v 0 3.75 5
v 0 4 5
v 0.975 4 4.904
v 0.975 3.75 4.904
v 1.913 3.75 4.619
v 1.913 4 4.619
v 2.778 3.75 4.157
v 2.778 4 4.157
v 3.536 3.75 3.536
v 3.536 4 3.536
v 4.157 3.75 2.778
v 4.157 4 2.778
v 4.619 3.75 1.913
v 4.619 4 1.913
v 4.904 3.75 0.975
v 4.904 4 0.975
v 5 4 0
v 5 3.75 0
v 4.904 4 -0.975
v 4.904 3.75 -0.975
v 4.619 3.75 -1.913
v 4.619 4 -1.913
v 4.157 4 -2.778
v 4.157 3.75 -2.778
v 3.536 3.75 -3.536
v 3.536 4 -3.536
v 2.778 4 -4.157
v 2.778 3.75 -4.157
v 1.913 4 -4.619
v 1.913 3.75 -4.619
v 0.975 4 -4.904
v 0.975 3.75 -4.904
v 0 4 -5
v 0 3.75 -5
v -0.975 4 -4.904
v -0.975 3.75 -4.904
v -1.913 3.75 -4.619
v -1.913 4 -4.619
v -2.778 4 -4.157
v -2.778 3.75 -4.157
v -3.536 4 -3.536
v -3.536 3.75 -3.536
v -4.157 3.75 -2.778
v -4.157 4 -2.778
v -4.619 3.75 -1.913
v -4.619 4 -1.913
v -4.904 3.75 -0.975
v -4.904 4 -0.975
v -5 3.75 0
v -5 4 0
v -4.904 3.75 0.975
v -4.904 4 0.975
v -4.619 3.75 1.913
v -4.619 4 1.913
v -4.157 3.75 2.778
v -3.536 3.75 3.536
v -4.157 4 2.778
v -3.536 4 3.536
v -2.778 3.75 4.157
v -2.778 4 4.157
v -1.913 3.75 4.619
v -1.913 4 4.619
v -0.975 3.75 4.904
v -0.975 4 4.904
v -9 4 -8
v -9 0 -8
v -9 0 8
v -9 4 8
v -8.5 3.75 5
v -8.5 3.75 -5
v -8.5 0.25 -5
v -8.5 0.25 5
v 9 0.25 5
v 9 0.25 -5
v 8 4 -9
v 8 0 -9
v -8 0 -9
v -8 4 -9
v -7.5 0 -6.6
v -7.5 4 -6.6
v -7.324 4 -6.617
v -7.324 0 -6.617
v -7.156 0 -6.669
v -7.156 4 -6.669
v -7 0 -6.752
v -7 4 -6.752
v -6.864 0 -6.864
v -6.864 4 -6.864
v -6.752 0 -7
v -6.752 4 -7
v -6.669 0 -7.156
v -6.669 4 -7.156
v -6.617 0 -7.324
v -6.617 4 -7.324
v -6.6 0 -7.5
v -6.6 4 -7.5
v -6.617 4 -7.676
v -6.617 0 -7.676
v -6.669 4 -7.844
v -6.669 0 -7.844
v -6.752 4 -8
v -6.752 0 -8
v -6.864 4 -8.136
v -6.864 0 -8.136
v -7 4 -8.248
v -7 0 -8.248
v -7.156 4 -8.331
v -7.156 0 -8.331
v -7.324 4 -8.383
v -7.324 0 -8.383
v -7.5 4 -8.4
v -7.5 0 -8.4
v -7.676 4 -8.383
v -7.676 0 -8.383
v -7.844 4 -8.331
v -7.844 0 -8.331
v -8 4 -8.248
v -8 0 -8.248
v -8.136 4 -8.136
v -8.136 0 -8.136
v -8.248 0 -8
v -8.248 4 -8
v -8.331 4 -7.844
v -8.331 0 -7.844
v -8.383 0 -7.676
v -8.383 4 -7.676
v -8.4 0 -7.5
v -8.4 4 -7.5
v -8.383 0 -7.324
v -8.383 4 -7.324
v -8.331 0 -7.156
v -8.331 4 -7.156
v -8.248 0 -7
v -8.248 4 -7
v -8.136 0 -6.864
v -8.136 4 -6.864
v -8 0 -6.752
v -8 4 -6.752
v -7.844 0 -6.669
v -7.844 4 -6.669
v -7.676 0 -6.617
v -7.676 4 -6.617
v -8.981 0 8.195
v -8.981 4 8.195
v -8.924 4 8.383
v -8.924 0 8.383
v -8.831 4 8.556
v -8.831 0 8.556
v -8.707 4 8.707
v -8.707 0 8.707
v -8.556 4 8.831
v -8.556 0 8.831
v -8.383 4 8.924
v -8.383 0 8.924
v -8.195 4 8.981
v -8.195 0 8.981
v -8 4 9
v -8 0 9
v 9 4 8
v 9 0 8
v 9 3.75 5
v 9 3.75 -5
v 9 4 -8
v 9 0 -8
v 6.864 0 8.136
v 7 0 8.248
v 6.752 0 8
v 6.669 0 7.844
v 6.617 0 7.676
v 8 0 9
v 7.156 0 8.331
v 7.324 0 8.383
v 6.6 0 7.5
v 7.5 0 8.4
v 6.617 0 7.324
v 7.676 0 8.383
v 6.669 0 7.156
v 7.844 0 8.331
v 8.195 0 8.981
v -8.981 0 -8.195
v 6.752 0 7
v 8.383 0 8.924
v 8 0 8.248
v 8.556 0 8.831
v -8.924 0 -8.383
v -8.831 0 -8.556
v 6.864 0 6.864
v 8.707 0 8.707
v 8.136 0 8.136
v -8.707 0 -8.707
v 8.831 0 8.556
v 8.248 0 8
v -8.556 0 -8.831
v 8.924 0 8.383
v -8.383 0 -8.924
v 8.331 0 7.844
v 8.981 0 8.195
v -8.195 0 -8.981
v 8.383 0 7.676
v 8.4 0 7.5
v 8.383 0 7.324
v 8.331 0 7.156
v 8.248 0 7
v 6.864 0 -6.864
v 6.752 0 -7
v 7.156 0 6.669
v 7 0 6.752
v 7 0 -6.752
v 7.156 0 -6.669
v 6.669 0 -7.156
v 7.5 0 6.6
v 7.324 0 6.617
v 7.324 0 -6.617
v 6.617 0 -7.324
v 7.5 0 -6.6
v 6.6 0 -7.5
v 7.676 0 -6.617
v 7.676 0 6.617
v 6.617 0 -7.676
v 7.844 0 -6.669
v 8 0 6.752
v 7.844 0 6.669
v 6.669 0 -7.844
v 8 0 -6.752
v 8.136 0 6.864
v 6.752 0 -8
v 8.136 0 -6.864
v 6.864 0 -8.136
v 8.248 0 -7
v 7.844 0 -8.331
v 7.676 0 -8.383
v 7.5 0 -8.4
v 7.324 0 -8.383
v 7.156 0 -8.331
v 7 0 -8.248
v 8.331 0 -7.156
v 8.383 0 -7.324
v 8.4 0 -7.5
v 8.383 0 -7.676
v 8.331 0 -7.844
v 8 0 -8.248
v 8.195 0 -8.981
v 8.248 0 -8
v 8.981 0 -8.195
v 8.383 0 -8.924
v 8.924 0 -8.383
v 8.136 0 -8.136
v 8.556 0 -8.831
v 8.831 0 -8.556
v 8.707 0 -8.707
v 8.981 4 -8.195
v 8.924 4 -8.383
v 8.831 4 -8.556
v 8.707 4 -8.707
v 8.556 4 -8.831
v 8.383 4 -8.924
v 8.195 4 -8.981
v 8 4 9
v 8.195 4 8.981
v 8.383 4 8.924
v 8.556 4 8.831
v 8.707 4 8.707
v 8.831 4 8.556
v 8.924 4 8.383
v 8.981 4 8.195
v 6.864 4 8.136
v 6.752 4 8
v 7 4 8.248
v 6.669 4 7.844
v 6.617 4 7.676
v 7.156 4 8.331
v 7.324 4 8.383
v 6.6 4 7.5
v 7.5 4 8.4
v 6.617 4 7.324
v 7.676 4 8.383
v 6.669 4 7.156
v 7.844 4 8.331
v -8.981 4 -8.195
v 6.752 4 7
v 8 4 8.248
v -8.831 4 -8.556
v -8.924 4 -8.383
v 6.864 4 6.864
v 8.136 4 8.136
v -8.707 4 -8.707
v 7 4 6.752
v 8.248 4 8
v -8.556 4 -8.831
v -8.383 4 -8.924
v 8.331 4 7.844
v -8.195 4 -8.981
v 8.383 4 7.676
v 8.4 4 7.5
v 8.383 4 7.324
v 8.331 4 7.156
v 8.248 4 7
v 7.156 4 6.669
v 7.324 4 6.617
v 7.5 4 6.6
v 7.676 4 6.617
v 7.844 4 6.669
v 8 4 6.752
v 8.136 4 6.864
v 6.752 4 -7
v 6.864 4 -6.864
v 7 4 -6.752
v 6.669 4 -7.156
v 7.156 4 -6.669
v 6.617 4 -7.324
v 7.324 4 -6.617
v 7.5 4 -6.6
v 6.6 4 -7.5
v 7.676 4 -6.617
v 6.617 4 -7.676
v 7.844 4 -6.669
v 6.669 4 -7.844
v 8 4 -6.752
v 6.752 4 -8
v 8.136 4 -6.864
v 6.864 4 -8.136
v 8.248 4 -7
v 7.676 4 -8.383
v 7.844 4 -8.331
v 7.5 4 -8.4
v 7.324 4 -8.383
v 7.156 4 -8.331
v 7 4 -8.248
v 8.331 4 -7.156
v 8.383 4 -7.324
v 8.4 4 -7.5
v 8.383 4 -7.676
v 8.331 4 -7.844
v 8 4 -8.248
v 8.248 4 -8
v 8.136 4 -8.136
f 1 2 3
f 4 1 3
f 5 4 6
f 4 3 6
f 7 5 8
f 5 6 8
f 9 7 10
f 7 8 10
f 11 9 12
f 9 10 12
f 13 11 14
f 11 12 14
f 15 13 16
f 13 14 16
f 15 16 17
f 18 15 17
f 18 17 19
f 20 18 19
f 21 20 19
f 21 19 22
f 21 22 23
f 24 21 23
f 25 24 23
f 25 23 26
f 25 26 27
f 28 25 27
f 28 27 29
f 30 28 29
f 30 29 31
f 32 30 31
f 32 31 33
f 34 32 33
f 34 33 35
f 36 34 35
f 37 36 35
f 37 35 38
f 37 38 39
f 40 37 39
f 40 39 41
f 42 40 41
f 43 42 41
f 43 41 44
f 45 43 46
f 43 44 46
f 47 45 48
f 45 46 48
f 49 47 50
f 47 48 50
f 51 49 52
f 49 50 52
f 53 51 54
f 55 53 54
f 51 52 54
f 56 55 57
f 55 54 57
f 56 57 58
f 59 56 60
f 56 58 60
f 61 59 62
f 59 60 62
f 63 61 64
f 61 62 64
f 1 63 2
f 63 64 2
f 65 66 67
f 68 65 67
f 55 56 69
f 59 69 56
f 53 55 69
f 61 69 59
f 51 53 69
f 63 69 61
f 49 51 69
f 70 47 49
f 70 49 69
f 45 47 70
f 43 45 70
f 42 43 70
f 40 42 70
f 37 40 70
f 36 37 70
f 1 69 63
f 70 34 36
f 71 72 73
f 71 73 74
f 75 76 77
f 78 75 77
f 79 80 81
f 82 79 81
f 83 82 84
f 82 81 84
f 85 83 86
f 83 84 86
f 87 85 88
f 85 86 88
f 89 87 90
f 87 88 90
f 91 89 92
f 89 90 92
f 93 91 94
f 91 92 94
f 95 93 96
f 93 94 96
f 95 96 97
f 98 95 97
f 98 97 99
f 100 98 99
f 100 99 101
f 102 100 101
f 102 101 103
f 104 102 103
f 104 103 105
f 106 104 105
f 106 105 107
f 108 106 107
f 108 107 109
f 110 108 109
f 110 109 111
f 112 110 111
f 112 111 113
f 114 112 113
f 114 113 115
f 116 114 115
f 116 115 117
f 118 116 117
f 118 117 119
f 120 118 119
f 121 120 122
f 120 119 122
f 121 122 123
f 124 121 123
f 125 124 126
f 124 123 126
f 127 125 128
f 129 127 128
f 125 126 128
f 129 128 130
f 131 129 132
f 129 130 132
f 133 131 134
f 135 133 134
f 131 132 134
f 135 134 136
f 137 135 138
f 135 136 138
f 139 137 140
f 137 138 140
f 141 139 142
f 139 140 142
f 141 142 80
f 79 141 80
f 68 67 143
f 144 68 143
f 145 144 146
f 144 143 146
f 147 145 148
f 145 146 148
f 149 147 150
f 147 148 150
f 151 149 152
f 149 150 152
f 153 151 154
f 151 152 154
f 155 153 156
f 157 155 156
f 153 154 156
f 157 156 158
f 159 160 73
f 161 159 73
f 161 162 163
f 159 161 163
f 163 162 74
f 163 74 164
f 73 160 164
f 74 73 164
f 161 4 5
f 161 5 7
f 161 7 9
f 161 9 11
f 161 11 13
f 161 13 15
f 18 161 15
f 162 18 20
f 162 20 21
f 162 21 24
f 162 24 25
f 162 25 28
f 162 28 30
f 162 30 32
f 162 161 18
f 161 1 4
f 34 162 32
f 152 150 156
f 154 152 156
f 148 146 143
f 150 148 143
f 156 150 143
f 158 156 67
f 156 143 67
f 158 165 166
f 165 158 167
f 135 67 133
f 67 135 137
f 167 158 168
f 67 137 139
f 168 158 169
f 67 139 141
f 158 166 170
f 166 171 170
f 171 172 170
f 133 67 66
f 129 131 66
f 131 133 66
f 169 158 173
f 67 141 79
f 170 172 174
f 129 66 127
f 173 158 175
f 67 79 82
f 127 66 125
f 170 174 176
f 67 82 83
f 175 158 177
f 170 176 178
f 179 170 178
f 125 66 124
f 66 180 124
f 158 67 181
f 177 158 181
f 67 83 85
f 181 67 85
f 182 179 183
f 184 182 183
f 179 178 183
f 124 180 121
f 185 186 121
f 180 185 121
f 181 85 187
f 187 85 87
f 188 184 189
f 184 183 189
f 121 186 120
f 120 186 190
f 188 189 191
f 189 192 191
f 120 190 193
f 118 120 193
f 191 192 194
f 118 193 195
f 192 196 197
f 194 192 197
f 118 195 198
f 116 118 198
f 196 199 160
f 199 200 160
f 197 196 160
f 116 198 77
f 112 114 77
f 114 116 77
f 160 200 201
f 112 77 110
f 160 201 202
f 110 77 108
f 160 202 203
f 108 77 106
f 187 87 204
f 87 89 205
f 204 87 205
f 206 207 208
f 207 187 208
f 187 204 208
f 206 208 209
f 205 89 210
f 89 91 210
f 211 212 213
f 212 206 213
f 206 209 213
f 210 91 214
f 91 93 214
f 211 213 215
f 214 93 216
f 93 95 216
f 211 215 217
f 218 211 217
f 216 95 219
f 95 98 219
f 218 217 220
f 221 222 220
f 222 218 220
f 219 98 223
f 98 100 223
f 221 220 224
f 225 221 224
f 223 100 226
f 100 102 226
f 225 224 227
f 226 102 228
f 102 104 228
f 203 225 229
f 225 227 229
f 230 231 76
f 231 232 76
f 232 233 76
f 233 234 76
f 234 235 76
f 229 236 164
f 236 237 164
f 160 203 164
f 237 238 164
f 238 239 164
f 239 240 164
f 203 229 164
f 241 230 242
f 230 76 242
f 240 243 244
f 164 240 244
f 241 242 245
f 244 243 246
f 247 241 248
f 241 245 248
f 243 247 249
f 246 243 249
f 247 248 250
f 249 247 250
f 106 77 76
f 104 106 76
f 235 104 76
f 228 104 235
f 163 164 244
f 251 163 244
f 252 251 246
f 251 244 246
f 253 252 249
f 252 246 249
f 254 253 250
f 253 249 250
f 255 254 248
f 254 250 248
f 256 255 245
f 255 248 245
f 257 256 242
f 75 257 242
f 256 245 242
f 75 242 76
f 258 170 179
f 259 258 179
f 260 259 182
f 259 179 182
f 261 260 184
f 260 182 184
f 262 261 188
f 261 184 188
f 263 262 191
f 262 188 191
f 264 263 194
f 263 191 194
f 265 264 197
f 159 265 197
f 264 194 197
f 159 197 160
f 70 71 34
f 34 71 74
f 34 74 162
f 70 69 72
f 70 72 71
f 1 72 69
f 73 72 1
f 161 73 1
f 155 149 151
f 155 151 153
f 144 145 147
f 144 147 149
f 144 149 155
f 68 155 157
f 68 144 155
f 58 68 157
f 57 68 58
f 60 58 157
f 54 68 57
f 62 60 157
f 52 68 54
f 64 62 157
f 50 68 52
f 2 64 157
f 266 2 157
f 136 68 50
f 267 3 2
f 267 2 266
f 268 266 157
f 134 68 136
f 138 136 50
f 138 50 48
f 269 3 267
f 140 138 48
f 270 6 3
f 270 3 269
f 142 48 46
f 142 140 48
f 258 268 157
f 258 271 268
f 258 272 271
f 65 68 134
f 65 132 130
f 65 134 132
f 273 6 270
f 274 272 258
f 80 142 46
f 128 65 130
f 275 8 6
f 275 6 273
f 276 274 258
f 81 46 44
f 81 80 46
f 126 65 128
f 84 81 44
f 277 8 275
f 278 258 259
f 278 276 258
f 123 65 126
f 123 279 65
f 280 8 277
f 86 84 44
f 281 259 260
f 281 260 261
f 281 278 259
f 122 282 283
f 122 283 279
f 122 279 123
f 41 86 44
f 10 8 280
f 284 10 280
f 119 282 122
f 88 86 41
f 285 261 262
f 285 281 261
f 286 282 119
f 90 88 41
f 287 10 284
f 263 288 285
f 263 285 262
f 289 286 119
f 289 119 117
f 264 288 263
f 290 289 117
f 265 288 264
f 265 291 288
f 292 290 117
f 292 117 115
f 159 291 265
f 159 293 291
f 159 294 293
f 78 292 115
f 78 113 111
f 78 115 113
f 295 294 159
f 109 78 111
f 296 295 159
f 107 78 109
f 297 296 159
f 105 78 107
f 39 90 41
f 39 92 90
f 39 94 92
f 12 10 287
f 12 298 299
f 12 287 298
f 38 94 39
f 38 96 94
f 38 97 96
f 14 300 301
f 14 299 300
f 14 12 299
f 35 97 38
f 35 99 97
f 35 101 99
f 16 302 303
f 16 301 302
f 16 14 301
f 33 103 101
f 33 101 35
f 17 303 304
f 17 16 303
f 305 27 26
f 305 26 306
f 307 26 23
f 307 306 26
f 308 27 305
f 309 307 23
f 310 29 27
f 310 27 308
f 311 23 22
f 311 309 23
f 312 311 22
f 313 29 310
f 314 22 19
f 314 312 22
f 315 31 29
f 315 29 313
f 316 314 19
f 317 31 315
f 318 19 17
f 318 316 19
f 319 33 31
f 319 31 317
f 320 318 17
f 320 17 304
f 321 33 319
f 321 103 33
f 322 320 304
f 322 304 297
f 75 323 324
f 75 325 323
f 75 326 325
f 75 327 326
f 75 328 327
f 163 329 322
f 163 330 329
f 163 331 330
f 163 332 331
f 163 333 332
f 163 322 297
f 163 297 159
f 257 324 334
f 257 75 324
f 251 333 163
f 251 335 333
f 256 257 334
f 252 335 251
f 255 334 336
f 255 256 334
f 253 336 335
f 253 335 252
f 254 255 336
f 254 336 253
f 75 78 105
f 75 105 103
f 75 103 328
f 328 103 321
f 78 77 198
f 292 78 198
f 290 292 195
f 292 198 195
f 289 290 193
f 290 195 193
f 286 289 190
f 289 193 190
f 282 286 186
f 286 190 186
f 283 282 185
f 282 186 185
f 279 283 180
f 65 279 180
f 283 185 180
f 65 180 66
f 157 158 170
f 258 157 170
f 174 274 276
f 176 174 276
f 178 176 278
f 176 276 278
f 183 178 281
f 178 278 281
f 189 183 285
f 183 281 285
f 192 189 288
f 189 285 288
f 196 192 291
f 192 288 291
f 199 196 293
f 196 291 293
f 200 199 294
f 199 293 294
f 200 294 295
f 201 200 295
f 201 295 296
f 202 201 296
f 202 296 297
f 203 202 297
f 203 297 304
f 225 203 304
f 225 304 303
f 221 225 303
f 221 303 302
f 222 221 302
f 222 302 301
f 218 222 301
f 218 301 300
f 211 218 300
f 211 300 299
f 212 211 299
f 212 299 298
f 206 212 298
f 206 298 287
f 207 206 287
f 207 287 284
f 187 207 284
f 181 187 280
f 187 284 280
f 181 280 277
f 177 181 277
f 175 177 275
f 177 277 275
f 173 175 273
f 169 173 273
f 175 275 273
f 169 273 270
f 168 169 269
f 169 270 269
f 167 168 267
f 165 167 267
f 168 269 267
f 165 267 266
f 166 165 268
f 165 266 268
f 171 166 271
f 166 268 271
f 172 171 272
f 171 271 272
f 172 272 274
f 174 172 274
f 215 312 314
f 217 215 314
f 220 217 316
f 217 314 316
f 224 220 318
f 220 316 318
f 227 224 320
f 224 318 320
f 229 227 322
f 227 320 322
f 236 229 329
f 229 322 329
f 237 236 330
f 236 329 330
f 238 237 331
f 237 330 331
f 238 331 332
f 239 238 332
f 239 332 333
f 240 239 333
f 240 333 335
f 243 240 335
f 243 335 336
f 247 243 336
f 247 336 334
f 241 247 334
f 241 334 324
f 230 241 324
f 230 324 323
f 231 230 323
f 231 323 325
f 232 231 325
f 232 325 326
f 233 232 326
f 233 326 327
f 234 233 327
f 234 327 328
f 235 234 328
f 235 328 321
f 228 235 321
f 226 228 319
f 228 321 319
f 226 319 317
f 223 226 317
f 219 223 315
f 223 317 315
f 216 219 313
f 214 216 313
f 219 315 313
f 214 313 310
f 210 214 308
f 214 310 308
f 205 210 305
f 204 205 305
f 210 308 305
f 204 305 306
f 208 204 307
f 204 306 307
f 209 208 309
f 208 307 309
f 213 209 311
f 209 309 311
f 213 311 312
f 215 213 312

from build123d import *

# Parameters (mm, degrees)
BOSS_EXTRUDE1_DEPTH = 4
CUT_EXTRUDE1_REACH  = 15.342
SKETCH4_R           = 0.9
SKETCH5_R           = 5
CUT_EXTRUDE2_DEPTH  = 3.75
SKETCH6_W           = 10
SKETCH6_H           = 3.5
CUT_EXTRUDE3_DEPTH  = 17.5


with BuildPart() as part:
    # Sketch3 → Boss-Extrude1 (new body)
    with BuildSketch(Plane(origin=(0, 0, 0), x_dir=(1, 0, 0), z_dir=(0, 1, 0))):
        with BuildLine():
            Line((-8, -9), (8, -9))
            ThreePointArc((8, -9), (8.707106781, -8.707106781), (9, -8))
            Line((9, -8), (9, 8))
            ThreePointArc((9, 8), (8.707106781, 8.707106781), (8, 9))
            Line((8, 9), (-8, 9))
            ThreePointArc((-8, 9), (-8.707106781, 8.707106781), (-9, 8))
            Line((-9, 8), (-9, -8))
            ThreePointArc((-9, -8), (-8.707106781, -8.707106781), (-8, -9))
        make_face()
    extrude(amount=BOSS_EXTRUDE1_DEPTH)

    # Sketch4 → Cut-Extrude1 (cut, up to next)
    with BuildSketch(Plane(origin=(0, 4, 0), x_dir=(1, 0, 0), z_dir=(0, 1, 0)), mode=Mode.PRIVATE) as cut_extrude1_sk1:
        with Locations(Location((7.5, -7.5, 0), (0, 0, 270))):
            Circle(SKETCH4_R)
    cut_extrude1_tool1 = extrude(cut_extrude1_sk1.sketch, amount=-CUT_EXTRUDE1_REACH, mode=Mode.PRIVATE) & part.part
    # Sketch4 → Cut-Extrude1 (cut, up to next)
    with BuildSketch(Plane(origin=(0, 4, 0), x_dir=(1, 0, 0), z_dir=(0, 1, 0)), mode=Mode.PRIVATE) as cut_extrude1_sk2:
        with Locations(Location((7.5, 7.5, 0), (0, 0, 270))):
            Circle(SKETCH4_R)
    cut_extrude1_tool2 = extrude(cut_extrude1_sk2.sketch, amount=-CUT_EXTRUDE1_REACH, mode=Mode.PRIVATE) & part.part
    # Sketch4 → Cut-Extrude1 (cut, up to next)
    with BuildSketch(Plane(origin=(0, 4, 0), x_dir=(1, 0, 0), z_dir=(0, 1, 0)), mode=Mode.PRIVATE) as cut_extrude1_sk3:
        with Locations(Location((-7.5, 7.5, 0), (0, 0, 270))):
            Circle(SKETCH4_R)
    cut_extrude1_tool3 = extrude(cut_extrude1_sk3.sketch, amount=-CUT_EXTRUDE1_REACH, mode=Mode.PRIVATE) & part.part
    add(cut_extrude1_tool1.solids().sort_by_distance((7.5, 4, 7.5))[0], mode=Mode.SUBTRACT)
    add(cut_extrude1_tool2.solids().sort_by_distance((7.5, 4, -7.5))[0], mode=Mode.SUBTRACT)
    add(cut_extrude1_tool3.solids().sort_by_distance((-7.5, 4, -7.5))[0], mode=Mode.SUBTRACT)

    # Sketch5 → Cut-Extrude2 (cut)
    with BuildSketch(Plane(origin=(0, 4, 0), x_dir=(1, 0, 0), z_dir=(0, 1, 0))):
        with Locations(Location((0, 0, 0), (0, 0, 270))):
            Circle(SKETCH5_R)
    extrude(amount=-CUT_EXTRUDE2_DEPTH, mode=Mode.SUBTRACT)

    # Sketch6 → Cut-Extrude3 (cut)
    with BuildSketch(Plane(origin=(9, 0, 0), x_dir=(0, 0, -1), z_dir=(1, 0, 0))):
        with Locations((0, 2)):
            Rectangle(SKETCH6_W, SKETCH6_H)
    extrude(amount=-CUT_EXTRUDE3_DEPTH, mode=Mode.SUBTRACT)


solid = part.part
